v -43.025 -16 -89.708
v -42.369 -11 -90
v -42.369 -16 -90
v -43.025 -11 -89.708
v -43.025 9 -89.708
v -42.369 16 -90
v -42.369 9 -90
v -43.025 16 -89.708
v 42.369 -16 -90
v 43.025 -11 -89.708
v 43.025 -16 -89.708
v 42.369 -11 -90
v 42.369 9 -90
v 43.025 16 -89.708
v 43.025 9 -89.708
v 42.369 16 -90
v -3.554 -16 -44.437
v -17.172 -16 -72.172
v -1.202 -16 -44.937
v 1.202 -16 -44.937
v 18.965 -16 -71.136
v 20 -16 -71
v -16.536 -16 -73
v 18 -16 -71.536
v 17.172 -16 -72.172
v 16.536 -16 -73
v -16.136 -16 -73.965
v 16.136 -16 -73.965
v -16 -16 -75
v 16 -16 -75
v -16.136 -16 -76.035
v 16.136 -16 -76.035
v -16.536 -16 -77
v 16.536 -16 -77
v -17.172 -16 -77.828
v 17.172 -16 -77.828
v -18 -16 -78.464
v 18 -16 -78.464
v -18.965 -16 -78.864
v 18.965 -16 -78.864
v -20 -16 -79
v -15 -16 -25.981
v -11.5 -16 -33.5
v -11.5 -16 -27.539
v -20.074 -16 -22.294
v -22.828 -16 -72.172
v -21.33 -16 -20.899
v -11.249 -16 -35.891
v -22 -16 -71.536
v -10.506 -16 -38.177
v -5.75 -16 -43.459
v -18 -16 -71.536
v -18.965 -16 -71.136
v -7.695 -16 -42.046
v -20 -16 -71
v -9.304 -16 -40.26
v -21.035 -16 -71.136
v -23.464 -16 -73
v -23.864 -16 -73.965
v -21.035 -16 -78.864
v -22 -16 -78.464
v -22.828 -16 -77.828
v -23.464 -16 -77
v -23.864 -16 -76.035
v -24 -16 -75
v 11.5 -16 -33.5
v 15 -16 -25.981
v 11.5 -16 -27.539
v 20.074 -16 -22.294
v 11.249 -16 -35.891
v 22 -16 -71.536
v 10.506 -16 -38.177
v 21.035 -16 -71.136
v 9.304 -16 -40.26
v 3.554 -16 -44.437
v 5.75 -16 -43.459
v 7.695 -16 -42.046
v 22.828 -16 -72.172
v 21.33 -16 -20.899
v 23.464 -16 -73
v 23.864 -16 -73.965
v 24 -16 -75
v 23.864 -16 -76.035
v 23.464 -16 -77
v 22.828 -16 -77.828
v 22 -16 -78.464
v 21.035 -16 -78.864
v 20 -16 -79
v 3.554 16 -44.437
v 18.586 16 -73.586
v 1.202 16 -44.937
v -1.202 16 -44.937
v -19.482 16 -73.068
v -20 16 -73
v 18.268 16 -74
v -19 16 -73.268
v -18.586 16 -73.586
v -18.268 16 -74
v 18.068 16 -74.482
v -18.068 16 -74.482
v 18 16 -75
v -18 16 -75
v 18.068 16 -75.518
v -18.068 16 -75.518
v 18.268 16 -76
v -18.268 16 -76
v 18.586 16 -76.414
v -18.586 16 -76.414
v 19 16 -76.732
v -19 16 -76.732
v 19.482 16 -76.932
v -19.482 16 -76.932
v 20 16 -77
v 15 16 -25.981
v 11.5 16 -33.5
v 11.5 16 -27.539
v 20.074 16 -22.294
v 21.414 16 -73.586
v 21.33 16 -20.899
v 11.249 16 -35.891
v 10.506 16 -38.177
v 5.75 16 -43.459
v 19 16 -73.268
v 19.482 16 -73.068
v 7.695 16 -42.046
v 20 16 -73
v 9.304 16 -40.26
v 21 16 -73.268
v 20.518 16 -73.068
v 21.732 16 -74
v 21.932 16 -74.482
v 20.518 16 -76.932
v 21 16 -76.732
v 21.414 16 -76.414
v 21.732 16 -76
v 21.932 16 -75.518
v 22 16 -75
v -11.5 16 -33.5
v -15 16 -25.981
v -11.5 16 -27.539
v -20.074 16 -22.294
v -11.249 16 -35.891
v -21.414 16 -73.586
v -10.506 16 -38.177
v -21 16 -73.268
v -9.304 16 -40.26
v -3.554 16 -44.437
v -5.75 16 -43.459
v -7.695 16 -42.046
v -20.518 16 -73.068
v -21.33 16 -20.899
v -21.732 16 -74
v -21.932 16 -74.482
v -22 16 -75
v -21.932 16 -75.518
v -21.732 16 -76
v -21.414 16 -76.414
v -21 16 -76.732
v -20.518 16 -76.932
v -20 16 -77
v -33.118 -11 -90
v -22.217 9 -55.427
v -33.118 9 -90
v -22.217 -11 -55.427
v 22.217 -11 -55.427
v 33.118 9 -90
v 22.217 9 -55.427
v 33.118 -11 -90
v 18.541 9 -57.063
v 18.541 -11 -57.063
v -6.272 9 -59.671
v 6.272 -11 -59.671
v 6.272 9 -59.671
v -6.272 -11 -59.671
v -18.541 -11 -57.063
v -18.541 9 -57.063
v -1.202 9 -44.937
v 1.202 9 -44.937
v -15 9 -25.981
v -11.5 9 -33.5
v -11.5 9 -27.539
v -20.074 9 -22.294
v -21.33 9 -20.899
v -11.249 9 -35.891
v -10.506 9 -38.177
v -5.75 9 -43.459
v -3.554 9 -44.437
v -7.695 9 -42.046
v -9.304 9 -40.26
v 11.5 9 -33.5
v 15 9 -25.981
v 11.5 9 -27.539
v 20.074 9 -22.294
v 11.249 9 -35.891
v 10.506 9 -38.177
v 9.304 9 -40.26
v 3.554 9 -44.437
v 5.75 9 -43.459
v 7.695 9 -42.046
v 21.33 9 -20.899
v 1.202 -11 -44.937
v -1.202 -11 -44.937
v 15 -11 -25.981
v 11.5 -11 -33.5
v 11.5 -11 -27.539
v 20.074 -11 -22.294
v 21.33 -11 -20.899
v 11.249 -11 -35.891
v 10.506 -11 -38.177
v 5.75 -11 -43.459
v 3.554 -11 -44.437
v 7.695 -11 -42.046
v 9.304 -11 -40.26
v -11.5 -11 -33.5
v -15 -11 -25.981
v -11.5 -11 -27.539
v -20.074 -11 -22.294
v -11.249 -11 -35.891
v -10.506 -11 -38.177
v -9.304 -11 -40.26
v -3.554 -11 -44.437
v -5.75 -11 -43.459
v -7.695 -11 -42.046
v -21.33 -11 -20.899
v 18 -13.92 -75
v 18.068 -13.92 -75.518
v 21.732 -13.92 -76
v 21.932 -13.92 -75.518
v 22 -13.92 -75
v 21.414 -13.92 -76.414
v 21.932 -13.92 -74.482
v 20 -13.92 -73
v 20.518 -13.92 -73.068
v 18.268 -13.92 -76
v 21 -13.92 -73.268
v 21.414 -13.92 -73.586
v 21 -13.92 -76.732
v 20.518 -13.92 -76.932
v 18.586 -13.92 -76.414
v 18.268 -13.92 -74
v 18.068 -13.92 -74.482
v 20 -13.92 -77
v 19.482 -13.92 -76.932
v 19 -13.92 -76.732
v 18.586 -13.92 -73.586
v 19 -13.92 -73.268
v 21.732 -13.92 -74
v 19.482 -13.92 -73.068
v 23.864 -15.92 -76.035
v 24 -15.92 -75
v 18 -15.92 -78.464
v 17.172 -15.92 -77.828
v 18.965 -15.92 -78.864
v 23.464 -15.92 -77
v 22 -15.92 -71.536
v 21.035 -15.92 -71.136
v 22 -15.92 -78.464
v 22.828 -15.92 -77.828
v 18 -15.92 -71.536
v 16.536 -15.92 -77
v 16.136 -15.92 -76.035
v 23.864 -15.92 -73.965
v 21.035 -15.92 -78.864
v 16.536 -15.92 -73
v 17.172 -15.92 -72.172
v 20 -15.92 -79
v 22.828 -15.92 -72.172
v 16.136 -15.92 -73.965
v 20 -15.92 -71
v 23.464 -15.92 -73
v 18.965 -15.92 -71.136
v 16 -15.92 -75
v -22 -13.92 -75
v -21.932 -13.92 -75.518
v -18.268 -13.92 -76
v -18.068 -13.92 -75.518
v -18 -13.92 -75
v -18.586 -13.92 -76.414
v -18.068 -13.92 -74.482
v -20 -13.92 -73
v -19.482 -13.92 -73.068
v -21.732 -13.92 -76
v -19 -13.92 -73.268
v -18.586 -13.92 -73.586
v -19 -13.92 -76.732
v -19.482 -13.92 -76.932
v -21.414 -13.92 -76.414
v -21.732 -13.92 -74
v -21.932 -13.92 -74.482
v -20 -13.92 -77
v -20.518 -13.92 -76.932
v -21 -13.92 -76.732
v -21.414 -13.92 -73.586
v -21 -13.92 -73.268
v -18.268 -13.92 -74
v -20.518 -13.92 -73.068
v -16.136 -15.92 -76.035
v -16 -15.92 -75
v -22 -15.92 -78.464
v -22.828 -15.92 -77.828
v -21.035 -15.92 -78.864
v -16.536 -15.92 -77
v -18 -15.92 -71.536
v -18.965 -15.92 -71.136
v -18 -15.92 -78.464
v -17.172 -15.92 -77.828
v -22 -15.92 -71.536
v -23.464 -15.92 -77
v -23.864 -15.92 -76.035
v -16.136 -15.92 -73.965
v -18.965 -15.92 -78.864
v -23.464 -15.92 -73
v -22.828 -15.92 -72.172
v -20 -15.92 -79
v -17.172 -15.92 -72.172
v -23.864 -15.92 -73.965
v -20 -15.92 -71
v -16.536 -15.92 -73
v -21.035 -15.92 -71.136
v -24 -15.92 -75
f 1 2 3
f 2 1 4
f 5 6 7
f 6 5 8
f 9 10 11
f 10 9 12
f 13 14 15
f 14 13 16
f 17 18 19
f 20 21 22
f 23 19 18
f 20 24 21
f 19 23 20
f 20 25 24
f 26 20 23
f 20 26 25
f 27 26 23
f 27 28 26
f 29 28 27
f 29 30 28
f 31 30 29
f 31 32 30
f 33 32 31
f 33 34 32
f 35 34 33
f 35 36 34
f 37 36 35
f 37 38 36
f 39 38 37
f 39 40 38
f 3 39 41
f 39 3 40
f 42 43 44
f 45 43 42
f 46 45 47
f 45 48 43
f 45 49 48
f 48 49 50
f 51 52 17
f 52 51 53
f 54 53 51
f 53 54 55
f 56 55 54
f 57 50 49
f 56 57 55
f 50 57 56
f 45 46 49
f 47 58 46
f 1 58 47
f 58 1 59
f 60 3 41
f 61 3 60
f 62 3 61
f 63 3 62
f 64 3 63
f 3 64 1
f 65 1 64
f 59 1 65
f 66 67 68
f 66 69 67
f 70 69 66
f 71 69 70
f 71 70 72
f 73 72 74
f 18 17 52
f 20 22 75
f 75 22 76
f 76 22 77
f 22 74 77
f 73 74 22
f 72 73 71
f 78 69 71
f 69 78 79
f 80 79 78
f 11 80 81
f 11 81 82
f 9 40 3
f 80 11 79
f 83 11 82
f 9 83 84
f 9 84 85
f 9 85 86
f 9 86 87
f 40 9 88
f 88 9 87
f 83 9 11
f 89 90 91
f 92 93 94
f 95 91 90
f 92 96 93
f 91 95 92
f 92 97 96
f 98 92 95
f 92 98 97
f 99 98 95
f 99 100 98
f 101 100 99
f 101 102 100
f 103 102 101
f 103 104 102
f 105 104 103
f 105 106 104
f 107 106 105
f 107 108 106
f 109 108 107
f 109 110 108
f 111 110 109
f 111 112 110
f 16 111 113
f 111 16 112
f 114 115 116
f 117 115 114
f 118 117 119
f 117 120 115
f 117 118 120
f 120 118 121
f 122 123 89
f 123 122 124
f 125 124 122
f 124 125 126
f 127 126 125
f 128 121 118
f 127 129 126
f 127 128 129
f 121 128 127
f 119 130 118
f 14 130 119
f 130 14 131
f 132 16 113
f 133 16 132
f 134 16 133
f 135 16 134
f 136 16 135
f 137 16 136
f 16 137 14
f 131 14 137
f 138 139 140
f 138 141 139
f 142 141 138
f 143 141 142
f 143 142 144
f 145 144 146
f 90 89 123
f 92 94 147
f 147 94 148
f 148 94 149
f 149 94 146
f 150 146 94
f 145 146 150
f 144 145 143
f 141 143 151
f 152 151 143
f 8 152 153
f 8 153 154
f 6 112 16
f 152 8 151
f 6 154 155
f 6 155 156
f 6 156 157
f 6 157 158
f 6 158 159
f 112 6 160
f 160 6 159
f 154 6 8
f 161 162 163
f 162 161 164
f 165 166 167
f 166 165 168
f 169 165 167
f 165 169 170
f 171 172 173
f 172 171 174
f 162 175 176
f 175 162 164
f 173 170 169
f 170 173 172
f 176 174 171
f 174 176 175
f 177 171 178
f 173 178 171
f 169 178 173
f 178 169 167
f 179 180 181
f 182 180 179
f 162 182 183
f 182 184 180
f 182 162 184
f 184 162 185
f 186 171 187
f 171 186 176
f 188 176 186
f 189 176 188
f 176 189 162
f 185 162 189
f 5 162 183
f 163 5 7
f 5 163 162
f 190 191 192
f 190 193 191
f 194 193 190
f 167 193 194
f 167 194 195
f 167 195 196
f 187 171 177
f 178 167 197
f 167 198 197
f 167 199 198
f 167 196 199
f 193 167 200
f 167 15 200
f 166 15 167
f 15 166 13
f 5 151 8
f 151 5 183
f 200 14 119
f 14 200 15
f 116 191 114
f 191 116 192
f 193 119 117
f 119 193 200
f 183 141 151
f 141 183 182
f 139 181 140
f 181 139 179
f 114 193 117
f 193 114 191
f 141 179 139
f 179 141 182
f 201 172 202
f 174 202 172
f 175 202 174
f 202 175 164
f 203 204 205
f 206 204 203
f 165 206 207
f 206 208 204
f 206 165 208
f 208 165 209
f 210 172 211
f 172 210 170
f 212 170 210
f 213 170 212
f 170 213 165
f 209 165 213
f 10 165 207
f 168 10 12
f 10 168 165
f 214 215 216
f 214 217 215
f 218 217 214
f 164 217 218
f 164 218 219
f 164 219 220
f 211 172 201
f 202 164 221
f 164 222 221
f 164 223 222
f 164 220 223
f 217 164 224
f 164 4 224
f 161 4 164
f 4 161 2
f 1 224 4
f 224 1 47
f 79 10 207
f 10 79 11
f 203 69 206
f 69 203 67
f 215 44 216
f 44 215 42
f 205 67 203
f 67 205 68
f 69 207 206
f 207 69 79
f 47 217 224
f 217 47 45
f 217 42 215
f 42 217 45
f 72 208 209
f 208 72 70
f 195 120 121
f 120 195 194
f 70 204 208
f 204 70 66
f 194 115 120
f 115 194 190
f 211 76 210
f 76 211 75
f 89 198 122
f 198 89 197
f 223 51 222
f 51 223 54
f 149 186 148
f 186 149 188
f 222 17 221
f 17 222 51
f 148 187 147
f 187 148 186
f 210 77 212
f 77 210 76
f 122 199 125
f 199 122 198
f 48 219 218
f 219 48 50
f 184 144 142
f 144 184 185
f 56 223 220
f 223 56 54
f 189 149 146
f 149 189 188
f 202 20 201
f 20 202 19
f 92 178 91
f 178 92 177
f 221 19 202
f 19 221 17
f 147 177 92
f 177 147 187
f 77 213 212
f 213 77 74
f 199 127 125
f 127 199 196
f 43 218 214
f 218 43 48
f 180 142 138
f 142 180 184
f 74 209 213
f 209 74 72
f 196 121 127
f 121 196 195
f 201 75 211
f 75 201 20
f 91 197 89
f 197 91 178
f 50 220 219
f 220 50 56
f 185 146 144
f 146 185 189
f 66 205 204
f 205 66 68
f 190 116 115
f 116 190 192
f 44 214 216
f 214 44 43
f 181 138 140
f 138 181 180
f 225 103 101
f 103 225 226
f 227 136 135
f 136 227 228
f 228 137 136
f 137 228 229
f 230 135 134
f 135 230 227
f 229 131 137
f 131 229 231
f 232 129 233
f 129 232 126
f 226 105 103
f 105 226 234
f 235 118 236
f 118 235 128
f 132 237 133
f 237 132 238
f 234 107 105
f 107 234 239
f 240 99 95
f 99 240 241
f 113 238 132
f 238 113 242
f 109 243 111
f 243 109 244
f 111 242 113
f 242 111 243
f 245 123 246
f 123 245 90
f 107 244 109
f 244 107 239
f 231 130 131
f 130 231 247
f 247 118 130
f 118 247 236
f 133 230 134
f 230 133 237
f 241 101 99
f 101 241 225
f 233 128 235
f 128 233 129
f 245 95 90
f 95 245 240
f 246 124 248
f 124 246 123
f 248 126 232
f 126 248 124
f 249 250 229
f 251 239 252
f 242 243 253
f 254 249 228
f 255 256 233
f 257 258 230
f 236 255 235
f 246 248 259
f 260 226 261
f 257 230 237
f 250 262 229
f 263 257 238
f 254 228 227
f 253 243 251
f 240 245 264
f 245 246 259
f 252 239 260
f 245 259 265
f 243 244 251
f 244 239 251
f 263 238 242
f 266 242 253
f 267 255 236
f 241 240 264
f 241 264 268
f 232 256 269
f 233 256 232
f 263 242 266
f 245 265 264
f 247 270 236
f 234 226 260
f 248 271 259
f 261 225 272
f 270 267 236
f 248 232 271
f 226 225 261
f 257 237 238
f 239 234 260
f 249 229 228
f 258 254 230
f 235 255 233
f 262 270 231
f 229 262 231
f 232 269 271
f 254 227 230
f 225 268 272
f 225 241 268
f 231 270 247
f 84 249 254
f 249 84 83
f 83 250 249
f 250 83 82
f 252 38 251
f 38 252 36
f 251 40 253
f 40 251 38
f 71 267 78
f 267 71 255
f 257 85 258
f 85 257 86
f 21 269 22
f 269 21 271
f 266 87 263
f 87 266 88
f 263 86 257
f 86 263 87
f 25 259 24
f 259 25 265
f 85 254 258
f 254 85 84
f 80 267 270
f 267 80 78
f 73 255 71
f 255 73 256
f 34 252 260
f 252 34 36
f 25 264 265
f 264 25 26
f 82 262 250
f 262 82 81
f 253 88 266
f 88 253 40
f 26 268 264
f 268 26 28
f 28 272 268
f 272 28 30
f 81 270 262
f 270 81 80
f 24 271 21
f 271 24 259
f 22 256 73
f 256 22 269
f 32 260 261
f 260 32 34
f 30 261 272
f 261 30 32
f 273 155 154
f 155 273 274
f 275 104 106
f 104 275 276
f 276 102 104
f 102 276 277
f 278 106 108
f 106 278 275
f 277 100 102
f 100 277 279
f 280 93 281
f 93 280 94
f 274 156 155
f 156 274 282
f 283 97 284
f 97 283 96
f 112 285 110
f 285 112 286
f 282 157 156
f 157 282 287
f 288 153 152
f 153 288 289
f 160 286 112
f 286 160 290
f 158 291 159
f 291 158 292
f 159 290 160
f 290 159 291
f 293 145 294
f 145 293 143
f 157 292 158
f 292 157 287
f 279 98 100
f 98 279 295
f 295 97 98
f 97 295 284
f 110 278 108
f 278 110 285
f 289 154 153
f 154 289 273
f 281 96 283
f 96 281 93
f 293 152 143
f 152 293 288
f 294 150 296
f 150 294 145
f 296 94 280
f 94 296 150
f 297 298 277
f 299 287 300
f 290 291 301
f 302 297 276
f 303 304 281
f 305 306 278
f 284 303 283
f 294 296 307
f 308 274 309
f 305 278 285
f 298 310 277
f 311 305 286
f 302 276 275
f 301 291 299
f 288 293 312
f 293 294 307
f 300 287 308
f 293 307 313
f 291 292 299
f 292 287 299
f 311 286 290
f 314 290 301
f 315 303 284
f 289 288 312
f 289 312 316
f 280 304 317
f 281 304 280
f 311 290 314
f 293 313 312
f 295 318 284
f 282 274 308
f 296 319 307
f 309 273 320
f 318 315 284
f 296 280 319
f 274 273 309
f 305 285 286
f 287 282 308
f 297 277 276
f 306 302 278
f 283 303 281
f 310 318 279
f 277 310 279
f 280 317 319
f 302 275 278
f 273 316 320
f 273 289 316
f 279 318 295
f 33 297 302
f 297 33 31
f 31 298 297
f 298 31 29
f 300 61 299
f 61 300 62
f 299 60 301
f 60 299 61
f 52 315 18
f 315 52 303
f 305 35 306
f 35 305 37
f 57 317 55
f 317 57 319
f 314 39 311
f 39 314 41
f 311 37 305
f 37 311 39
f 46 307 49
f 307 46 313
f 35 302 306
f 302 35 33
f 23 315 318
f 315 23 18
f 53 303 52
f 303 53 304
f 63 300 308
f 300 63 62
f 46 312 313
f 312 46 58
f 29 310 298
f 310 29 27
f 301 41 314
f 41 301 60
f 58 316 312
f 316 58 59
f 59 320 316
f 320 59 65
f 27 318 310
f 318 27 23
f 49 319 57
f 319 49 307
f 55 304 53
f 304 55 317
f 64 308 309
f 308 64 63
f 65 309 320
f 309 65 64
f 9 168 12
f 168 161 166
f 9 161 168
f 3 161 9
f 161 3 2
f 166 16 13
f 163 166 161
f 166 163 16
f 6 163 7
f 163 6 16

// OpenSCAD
// Wire stripper holder 3D Design

// Copyright (c) 2014 by Jeremy Bennett <jeremy.bennett@embecosm.com>

// Wire stripper 3D Design is licensed under a Creative Commons
// Attribution-ShareAlike 3.0 Unported License.

// You should have received a copy of the license along with this work.  If not, 
// see <http://creativecommons.org/licenses/by-sa/3.0/>.

// -----------------------------------------------------------------------------

// A screw hole with a countersink
module screwhole (bore, length) {
	iota = length / 100;
	half_length = length / 2 + iota;
	full_length = half_length * 2;
	union () {
		cylinder (d = bore, h = full_length, center = true, $fn = 24);
		translate (v = [0, 0, -half_length + bore / 4 + bore / 10])
			cylinder (d1 = bore * 2, d2 = bore, h = bore / 2, center = true, $fn = 24);
		translate (v = [0, 0, -half_length + bore / 20])
			cylinder (d = bore * 2, h = bore / 10, center = true, $fn = 24);
	}
}


// A screw hole for a screw parallel with the Y axis
module screwhole_y (bore, length, x_off, z_off) {
	iota = length / 100;
	translate (v = [x_off, 0, z_off])
		rotate (a = [-90, 0, 0])
			screwhole (bore = bore, length = length);
}


// Produce a curved wedge shape

// @param r_outer   Outer radius
// @param r_inner   Inner radius
// @param edge_off  Offset of sloping sides from radius
// @param tilt      Angle of radii for edges
// @param y_thick   Thickness in the Y direction
// @param y_off     Offset in the Y direction
module curve_wedge (r_outer, r_inner, edge_off, tilt, y_thick, y_off) {
	iota = y_thick / 10;
	half_base = r_outer * sin (tilt);
	height = r_outer * cos (tilt);
   x_thick = r_outer;
	len = r_outer * 4;
	translate (v = [0, y_off, 0])
		difference () {
			intersection () {
				rotate (a = [-90, 0, 0])
					cylinder (r = r_outer, h = y_thick, center = true);
				translate (v = [x_thick / 2 * cos (tilt) - edge_off, 0, 0])
					rotate (a = [0, tilt, 0])
						cube (size = [x_thick, y_thick, len], center = true);
				translate (v = [-x_thick / 2 * cos (tilt) + edge_off, 0, 0])
					rotate (a = [0, -tilt, 0])
						cube (size = [x_thick, y_thick, len], center = true);
			}
			rotate (a = [-90, 0, 0])
				cylinder (r = r_inner, h = y_thick + iota, center = true);
		}
}


// The hole for the bolt to slip through

// @param thick  The thickness of the hole
// @param diam   The diameter of the bolt head
module bolt_hole (thick, diam) {
	iota = thick / 100;
	height = (diam + thick) * 5;
	union () {
		rotate (a = [-90, 0, 0])
			cylinder (d = diam, h = thick + iota, center = true);
		translate (v = [0, 0, height / 2])
			cube (size = [diam, thick + iota, height], center = true);
	}
}


// The actual support
module strip_support () {
	difference () {
		union () {
			curve_wedge (r_outer = 100, r_inner = 60, edge_off = 0, tilt = 17.5,
			             y_thick = 32, y_off = 0);
			curve_wedge (r_outer = 100, r_inner = 30, edge_off = 10, tilt = 17.5,
			             y_thick = 7, y_off = (32 - 7) / 2);
			curve_wedge (r_outer = 100, r_inner = 30, edge_off = 10, tilt = 17.5,
			             y_thick = 5, y_off = -(32 - 5) / 2);
		}
		translate (v = [0, 0, -45+23/2])
			bolt_hole (thick = 32, diam = 23);
		screwhole_y (bore = 4, length = 32, x_off =  20, z_off = -75);
		screwhole_y (bore = 4, length = 32, x_off = -20, z_off = -75);
	}
}


// Support with a flat base for easier printing.
module flat_strip_support () {
	intersection () {
		strip_support ();
		translate (v = [0, 0, -45])
			cube (size = [200, 32, 90], center = true);
	}
}


flat_strip_support ();
